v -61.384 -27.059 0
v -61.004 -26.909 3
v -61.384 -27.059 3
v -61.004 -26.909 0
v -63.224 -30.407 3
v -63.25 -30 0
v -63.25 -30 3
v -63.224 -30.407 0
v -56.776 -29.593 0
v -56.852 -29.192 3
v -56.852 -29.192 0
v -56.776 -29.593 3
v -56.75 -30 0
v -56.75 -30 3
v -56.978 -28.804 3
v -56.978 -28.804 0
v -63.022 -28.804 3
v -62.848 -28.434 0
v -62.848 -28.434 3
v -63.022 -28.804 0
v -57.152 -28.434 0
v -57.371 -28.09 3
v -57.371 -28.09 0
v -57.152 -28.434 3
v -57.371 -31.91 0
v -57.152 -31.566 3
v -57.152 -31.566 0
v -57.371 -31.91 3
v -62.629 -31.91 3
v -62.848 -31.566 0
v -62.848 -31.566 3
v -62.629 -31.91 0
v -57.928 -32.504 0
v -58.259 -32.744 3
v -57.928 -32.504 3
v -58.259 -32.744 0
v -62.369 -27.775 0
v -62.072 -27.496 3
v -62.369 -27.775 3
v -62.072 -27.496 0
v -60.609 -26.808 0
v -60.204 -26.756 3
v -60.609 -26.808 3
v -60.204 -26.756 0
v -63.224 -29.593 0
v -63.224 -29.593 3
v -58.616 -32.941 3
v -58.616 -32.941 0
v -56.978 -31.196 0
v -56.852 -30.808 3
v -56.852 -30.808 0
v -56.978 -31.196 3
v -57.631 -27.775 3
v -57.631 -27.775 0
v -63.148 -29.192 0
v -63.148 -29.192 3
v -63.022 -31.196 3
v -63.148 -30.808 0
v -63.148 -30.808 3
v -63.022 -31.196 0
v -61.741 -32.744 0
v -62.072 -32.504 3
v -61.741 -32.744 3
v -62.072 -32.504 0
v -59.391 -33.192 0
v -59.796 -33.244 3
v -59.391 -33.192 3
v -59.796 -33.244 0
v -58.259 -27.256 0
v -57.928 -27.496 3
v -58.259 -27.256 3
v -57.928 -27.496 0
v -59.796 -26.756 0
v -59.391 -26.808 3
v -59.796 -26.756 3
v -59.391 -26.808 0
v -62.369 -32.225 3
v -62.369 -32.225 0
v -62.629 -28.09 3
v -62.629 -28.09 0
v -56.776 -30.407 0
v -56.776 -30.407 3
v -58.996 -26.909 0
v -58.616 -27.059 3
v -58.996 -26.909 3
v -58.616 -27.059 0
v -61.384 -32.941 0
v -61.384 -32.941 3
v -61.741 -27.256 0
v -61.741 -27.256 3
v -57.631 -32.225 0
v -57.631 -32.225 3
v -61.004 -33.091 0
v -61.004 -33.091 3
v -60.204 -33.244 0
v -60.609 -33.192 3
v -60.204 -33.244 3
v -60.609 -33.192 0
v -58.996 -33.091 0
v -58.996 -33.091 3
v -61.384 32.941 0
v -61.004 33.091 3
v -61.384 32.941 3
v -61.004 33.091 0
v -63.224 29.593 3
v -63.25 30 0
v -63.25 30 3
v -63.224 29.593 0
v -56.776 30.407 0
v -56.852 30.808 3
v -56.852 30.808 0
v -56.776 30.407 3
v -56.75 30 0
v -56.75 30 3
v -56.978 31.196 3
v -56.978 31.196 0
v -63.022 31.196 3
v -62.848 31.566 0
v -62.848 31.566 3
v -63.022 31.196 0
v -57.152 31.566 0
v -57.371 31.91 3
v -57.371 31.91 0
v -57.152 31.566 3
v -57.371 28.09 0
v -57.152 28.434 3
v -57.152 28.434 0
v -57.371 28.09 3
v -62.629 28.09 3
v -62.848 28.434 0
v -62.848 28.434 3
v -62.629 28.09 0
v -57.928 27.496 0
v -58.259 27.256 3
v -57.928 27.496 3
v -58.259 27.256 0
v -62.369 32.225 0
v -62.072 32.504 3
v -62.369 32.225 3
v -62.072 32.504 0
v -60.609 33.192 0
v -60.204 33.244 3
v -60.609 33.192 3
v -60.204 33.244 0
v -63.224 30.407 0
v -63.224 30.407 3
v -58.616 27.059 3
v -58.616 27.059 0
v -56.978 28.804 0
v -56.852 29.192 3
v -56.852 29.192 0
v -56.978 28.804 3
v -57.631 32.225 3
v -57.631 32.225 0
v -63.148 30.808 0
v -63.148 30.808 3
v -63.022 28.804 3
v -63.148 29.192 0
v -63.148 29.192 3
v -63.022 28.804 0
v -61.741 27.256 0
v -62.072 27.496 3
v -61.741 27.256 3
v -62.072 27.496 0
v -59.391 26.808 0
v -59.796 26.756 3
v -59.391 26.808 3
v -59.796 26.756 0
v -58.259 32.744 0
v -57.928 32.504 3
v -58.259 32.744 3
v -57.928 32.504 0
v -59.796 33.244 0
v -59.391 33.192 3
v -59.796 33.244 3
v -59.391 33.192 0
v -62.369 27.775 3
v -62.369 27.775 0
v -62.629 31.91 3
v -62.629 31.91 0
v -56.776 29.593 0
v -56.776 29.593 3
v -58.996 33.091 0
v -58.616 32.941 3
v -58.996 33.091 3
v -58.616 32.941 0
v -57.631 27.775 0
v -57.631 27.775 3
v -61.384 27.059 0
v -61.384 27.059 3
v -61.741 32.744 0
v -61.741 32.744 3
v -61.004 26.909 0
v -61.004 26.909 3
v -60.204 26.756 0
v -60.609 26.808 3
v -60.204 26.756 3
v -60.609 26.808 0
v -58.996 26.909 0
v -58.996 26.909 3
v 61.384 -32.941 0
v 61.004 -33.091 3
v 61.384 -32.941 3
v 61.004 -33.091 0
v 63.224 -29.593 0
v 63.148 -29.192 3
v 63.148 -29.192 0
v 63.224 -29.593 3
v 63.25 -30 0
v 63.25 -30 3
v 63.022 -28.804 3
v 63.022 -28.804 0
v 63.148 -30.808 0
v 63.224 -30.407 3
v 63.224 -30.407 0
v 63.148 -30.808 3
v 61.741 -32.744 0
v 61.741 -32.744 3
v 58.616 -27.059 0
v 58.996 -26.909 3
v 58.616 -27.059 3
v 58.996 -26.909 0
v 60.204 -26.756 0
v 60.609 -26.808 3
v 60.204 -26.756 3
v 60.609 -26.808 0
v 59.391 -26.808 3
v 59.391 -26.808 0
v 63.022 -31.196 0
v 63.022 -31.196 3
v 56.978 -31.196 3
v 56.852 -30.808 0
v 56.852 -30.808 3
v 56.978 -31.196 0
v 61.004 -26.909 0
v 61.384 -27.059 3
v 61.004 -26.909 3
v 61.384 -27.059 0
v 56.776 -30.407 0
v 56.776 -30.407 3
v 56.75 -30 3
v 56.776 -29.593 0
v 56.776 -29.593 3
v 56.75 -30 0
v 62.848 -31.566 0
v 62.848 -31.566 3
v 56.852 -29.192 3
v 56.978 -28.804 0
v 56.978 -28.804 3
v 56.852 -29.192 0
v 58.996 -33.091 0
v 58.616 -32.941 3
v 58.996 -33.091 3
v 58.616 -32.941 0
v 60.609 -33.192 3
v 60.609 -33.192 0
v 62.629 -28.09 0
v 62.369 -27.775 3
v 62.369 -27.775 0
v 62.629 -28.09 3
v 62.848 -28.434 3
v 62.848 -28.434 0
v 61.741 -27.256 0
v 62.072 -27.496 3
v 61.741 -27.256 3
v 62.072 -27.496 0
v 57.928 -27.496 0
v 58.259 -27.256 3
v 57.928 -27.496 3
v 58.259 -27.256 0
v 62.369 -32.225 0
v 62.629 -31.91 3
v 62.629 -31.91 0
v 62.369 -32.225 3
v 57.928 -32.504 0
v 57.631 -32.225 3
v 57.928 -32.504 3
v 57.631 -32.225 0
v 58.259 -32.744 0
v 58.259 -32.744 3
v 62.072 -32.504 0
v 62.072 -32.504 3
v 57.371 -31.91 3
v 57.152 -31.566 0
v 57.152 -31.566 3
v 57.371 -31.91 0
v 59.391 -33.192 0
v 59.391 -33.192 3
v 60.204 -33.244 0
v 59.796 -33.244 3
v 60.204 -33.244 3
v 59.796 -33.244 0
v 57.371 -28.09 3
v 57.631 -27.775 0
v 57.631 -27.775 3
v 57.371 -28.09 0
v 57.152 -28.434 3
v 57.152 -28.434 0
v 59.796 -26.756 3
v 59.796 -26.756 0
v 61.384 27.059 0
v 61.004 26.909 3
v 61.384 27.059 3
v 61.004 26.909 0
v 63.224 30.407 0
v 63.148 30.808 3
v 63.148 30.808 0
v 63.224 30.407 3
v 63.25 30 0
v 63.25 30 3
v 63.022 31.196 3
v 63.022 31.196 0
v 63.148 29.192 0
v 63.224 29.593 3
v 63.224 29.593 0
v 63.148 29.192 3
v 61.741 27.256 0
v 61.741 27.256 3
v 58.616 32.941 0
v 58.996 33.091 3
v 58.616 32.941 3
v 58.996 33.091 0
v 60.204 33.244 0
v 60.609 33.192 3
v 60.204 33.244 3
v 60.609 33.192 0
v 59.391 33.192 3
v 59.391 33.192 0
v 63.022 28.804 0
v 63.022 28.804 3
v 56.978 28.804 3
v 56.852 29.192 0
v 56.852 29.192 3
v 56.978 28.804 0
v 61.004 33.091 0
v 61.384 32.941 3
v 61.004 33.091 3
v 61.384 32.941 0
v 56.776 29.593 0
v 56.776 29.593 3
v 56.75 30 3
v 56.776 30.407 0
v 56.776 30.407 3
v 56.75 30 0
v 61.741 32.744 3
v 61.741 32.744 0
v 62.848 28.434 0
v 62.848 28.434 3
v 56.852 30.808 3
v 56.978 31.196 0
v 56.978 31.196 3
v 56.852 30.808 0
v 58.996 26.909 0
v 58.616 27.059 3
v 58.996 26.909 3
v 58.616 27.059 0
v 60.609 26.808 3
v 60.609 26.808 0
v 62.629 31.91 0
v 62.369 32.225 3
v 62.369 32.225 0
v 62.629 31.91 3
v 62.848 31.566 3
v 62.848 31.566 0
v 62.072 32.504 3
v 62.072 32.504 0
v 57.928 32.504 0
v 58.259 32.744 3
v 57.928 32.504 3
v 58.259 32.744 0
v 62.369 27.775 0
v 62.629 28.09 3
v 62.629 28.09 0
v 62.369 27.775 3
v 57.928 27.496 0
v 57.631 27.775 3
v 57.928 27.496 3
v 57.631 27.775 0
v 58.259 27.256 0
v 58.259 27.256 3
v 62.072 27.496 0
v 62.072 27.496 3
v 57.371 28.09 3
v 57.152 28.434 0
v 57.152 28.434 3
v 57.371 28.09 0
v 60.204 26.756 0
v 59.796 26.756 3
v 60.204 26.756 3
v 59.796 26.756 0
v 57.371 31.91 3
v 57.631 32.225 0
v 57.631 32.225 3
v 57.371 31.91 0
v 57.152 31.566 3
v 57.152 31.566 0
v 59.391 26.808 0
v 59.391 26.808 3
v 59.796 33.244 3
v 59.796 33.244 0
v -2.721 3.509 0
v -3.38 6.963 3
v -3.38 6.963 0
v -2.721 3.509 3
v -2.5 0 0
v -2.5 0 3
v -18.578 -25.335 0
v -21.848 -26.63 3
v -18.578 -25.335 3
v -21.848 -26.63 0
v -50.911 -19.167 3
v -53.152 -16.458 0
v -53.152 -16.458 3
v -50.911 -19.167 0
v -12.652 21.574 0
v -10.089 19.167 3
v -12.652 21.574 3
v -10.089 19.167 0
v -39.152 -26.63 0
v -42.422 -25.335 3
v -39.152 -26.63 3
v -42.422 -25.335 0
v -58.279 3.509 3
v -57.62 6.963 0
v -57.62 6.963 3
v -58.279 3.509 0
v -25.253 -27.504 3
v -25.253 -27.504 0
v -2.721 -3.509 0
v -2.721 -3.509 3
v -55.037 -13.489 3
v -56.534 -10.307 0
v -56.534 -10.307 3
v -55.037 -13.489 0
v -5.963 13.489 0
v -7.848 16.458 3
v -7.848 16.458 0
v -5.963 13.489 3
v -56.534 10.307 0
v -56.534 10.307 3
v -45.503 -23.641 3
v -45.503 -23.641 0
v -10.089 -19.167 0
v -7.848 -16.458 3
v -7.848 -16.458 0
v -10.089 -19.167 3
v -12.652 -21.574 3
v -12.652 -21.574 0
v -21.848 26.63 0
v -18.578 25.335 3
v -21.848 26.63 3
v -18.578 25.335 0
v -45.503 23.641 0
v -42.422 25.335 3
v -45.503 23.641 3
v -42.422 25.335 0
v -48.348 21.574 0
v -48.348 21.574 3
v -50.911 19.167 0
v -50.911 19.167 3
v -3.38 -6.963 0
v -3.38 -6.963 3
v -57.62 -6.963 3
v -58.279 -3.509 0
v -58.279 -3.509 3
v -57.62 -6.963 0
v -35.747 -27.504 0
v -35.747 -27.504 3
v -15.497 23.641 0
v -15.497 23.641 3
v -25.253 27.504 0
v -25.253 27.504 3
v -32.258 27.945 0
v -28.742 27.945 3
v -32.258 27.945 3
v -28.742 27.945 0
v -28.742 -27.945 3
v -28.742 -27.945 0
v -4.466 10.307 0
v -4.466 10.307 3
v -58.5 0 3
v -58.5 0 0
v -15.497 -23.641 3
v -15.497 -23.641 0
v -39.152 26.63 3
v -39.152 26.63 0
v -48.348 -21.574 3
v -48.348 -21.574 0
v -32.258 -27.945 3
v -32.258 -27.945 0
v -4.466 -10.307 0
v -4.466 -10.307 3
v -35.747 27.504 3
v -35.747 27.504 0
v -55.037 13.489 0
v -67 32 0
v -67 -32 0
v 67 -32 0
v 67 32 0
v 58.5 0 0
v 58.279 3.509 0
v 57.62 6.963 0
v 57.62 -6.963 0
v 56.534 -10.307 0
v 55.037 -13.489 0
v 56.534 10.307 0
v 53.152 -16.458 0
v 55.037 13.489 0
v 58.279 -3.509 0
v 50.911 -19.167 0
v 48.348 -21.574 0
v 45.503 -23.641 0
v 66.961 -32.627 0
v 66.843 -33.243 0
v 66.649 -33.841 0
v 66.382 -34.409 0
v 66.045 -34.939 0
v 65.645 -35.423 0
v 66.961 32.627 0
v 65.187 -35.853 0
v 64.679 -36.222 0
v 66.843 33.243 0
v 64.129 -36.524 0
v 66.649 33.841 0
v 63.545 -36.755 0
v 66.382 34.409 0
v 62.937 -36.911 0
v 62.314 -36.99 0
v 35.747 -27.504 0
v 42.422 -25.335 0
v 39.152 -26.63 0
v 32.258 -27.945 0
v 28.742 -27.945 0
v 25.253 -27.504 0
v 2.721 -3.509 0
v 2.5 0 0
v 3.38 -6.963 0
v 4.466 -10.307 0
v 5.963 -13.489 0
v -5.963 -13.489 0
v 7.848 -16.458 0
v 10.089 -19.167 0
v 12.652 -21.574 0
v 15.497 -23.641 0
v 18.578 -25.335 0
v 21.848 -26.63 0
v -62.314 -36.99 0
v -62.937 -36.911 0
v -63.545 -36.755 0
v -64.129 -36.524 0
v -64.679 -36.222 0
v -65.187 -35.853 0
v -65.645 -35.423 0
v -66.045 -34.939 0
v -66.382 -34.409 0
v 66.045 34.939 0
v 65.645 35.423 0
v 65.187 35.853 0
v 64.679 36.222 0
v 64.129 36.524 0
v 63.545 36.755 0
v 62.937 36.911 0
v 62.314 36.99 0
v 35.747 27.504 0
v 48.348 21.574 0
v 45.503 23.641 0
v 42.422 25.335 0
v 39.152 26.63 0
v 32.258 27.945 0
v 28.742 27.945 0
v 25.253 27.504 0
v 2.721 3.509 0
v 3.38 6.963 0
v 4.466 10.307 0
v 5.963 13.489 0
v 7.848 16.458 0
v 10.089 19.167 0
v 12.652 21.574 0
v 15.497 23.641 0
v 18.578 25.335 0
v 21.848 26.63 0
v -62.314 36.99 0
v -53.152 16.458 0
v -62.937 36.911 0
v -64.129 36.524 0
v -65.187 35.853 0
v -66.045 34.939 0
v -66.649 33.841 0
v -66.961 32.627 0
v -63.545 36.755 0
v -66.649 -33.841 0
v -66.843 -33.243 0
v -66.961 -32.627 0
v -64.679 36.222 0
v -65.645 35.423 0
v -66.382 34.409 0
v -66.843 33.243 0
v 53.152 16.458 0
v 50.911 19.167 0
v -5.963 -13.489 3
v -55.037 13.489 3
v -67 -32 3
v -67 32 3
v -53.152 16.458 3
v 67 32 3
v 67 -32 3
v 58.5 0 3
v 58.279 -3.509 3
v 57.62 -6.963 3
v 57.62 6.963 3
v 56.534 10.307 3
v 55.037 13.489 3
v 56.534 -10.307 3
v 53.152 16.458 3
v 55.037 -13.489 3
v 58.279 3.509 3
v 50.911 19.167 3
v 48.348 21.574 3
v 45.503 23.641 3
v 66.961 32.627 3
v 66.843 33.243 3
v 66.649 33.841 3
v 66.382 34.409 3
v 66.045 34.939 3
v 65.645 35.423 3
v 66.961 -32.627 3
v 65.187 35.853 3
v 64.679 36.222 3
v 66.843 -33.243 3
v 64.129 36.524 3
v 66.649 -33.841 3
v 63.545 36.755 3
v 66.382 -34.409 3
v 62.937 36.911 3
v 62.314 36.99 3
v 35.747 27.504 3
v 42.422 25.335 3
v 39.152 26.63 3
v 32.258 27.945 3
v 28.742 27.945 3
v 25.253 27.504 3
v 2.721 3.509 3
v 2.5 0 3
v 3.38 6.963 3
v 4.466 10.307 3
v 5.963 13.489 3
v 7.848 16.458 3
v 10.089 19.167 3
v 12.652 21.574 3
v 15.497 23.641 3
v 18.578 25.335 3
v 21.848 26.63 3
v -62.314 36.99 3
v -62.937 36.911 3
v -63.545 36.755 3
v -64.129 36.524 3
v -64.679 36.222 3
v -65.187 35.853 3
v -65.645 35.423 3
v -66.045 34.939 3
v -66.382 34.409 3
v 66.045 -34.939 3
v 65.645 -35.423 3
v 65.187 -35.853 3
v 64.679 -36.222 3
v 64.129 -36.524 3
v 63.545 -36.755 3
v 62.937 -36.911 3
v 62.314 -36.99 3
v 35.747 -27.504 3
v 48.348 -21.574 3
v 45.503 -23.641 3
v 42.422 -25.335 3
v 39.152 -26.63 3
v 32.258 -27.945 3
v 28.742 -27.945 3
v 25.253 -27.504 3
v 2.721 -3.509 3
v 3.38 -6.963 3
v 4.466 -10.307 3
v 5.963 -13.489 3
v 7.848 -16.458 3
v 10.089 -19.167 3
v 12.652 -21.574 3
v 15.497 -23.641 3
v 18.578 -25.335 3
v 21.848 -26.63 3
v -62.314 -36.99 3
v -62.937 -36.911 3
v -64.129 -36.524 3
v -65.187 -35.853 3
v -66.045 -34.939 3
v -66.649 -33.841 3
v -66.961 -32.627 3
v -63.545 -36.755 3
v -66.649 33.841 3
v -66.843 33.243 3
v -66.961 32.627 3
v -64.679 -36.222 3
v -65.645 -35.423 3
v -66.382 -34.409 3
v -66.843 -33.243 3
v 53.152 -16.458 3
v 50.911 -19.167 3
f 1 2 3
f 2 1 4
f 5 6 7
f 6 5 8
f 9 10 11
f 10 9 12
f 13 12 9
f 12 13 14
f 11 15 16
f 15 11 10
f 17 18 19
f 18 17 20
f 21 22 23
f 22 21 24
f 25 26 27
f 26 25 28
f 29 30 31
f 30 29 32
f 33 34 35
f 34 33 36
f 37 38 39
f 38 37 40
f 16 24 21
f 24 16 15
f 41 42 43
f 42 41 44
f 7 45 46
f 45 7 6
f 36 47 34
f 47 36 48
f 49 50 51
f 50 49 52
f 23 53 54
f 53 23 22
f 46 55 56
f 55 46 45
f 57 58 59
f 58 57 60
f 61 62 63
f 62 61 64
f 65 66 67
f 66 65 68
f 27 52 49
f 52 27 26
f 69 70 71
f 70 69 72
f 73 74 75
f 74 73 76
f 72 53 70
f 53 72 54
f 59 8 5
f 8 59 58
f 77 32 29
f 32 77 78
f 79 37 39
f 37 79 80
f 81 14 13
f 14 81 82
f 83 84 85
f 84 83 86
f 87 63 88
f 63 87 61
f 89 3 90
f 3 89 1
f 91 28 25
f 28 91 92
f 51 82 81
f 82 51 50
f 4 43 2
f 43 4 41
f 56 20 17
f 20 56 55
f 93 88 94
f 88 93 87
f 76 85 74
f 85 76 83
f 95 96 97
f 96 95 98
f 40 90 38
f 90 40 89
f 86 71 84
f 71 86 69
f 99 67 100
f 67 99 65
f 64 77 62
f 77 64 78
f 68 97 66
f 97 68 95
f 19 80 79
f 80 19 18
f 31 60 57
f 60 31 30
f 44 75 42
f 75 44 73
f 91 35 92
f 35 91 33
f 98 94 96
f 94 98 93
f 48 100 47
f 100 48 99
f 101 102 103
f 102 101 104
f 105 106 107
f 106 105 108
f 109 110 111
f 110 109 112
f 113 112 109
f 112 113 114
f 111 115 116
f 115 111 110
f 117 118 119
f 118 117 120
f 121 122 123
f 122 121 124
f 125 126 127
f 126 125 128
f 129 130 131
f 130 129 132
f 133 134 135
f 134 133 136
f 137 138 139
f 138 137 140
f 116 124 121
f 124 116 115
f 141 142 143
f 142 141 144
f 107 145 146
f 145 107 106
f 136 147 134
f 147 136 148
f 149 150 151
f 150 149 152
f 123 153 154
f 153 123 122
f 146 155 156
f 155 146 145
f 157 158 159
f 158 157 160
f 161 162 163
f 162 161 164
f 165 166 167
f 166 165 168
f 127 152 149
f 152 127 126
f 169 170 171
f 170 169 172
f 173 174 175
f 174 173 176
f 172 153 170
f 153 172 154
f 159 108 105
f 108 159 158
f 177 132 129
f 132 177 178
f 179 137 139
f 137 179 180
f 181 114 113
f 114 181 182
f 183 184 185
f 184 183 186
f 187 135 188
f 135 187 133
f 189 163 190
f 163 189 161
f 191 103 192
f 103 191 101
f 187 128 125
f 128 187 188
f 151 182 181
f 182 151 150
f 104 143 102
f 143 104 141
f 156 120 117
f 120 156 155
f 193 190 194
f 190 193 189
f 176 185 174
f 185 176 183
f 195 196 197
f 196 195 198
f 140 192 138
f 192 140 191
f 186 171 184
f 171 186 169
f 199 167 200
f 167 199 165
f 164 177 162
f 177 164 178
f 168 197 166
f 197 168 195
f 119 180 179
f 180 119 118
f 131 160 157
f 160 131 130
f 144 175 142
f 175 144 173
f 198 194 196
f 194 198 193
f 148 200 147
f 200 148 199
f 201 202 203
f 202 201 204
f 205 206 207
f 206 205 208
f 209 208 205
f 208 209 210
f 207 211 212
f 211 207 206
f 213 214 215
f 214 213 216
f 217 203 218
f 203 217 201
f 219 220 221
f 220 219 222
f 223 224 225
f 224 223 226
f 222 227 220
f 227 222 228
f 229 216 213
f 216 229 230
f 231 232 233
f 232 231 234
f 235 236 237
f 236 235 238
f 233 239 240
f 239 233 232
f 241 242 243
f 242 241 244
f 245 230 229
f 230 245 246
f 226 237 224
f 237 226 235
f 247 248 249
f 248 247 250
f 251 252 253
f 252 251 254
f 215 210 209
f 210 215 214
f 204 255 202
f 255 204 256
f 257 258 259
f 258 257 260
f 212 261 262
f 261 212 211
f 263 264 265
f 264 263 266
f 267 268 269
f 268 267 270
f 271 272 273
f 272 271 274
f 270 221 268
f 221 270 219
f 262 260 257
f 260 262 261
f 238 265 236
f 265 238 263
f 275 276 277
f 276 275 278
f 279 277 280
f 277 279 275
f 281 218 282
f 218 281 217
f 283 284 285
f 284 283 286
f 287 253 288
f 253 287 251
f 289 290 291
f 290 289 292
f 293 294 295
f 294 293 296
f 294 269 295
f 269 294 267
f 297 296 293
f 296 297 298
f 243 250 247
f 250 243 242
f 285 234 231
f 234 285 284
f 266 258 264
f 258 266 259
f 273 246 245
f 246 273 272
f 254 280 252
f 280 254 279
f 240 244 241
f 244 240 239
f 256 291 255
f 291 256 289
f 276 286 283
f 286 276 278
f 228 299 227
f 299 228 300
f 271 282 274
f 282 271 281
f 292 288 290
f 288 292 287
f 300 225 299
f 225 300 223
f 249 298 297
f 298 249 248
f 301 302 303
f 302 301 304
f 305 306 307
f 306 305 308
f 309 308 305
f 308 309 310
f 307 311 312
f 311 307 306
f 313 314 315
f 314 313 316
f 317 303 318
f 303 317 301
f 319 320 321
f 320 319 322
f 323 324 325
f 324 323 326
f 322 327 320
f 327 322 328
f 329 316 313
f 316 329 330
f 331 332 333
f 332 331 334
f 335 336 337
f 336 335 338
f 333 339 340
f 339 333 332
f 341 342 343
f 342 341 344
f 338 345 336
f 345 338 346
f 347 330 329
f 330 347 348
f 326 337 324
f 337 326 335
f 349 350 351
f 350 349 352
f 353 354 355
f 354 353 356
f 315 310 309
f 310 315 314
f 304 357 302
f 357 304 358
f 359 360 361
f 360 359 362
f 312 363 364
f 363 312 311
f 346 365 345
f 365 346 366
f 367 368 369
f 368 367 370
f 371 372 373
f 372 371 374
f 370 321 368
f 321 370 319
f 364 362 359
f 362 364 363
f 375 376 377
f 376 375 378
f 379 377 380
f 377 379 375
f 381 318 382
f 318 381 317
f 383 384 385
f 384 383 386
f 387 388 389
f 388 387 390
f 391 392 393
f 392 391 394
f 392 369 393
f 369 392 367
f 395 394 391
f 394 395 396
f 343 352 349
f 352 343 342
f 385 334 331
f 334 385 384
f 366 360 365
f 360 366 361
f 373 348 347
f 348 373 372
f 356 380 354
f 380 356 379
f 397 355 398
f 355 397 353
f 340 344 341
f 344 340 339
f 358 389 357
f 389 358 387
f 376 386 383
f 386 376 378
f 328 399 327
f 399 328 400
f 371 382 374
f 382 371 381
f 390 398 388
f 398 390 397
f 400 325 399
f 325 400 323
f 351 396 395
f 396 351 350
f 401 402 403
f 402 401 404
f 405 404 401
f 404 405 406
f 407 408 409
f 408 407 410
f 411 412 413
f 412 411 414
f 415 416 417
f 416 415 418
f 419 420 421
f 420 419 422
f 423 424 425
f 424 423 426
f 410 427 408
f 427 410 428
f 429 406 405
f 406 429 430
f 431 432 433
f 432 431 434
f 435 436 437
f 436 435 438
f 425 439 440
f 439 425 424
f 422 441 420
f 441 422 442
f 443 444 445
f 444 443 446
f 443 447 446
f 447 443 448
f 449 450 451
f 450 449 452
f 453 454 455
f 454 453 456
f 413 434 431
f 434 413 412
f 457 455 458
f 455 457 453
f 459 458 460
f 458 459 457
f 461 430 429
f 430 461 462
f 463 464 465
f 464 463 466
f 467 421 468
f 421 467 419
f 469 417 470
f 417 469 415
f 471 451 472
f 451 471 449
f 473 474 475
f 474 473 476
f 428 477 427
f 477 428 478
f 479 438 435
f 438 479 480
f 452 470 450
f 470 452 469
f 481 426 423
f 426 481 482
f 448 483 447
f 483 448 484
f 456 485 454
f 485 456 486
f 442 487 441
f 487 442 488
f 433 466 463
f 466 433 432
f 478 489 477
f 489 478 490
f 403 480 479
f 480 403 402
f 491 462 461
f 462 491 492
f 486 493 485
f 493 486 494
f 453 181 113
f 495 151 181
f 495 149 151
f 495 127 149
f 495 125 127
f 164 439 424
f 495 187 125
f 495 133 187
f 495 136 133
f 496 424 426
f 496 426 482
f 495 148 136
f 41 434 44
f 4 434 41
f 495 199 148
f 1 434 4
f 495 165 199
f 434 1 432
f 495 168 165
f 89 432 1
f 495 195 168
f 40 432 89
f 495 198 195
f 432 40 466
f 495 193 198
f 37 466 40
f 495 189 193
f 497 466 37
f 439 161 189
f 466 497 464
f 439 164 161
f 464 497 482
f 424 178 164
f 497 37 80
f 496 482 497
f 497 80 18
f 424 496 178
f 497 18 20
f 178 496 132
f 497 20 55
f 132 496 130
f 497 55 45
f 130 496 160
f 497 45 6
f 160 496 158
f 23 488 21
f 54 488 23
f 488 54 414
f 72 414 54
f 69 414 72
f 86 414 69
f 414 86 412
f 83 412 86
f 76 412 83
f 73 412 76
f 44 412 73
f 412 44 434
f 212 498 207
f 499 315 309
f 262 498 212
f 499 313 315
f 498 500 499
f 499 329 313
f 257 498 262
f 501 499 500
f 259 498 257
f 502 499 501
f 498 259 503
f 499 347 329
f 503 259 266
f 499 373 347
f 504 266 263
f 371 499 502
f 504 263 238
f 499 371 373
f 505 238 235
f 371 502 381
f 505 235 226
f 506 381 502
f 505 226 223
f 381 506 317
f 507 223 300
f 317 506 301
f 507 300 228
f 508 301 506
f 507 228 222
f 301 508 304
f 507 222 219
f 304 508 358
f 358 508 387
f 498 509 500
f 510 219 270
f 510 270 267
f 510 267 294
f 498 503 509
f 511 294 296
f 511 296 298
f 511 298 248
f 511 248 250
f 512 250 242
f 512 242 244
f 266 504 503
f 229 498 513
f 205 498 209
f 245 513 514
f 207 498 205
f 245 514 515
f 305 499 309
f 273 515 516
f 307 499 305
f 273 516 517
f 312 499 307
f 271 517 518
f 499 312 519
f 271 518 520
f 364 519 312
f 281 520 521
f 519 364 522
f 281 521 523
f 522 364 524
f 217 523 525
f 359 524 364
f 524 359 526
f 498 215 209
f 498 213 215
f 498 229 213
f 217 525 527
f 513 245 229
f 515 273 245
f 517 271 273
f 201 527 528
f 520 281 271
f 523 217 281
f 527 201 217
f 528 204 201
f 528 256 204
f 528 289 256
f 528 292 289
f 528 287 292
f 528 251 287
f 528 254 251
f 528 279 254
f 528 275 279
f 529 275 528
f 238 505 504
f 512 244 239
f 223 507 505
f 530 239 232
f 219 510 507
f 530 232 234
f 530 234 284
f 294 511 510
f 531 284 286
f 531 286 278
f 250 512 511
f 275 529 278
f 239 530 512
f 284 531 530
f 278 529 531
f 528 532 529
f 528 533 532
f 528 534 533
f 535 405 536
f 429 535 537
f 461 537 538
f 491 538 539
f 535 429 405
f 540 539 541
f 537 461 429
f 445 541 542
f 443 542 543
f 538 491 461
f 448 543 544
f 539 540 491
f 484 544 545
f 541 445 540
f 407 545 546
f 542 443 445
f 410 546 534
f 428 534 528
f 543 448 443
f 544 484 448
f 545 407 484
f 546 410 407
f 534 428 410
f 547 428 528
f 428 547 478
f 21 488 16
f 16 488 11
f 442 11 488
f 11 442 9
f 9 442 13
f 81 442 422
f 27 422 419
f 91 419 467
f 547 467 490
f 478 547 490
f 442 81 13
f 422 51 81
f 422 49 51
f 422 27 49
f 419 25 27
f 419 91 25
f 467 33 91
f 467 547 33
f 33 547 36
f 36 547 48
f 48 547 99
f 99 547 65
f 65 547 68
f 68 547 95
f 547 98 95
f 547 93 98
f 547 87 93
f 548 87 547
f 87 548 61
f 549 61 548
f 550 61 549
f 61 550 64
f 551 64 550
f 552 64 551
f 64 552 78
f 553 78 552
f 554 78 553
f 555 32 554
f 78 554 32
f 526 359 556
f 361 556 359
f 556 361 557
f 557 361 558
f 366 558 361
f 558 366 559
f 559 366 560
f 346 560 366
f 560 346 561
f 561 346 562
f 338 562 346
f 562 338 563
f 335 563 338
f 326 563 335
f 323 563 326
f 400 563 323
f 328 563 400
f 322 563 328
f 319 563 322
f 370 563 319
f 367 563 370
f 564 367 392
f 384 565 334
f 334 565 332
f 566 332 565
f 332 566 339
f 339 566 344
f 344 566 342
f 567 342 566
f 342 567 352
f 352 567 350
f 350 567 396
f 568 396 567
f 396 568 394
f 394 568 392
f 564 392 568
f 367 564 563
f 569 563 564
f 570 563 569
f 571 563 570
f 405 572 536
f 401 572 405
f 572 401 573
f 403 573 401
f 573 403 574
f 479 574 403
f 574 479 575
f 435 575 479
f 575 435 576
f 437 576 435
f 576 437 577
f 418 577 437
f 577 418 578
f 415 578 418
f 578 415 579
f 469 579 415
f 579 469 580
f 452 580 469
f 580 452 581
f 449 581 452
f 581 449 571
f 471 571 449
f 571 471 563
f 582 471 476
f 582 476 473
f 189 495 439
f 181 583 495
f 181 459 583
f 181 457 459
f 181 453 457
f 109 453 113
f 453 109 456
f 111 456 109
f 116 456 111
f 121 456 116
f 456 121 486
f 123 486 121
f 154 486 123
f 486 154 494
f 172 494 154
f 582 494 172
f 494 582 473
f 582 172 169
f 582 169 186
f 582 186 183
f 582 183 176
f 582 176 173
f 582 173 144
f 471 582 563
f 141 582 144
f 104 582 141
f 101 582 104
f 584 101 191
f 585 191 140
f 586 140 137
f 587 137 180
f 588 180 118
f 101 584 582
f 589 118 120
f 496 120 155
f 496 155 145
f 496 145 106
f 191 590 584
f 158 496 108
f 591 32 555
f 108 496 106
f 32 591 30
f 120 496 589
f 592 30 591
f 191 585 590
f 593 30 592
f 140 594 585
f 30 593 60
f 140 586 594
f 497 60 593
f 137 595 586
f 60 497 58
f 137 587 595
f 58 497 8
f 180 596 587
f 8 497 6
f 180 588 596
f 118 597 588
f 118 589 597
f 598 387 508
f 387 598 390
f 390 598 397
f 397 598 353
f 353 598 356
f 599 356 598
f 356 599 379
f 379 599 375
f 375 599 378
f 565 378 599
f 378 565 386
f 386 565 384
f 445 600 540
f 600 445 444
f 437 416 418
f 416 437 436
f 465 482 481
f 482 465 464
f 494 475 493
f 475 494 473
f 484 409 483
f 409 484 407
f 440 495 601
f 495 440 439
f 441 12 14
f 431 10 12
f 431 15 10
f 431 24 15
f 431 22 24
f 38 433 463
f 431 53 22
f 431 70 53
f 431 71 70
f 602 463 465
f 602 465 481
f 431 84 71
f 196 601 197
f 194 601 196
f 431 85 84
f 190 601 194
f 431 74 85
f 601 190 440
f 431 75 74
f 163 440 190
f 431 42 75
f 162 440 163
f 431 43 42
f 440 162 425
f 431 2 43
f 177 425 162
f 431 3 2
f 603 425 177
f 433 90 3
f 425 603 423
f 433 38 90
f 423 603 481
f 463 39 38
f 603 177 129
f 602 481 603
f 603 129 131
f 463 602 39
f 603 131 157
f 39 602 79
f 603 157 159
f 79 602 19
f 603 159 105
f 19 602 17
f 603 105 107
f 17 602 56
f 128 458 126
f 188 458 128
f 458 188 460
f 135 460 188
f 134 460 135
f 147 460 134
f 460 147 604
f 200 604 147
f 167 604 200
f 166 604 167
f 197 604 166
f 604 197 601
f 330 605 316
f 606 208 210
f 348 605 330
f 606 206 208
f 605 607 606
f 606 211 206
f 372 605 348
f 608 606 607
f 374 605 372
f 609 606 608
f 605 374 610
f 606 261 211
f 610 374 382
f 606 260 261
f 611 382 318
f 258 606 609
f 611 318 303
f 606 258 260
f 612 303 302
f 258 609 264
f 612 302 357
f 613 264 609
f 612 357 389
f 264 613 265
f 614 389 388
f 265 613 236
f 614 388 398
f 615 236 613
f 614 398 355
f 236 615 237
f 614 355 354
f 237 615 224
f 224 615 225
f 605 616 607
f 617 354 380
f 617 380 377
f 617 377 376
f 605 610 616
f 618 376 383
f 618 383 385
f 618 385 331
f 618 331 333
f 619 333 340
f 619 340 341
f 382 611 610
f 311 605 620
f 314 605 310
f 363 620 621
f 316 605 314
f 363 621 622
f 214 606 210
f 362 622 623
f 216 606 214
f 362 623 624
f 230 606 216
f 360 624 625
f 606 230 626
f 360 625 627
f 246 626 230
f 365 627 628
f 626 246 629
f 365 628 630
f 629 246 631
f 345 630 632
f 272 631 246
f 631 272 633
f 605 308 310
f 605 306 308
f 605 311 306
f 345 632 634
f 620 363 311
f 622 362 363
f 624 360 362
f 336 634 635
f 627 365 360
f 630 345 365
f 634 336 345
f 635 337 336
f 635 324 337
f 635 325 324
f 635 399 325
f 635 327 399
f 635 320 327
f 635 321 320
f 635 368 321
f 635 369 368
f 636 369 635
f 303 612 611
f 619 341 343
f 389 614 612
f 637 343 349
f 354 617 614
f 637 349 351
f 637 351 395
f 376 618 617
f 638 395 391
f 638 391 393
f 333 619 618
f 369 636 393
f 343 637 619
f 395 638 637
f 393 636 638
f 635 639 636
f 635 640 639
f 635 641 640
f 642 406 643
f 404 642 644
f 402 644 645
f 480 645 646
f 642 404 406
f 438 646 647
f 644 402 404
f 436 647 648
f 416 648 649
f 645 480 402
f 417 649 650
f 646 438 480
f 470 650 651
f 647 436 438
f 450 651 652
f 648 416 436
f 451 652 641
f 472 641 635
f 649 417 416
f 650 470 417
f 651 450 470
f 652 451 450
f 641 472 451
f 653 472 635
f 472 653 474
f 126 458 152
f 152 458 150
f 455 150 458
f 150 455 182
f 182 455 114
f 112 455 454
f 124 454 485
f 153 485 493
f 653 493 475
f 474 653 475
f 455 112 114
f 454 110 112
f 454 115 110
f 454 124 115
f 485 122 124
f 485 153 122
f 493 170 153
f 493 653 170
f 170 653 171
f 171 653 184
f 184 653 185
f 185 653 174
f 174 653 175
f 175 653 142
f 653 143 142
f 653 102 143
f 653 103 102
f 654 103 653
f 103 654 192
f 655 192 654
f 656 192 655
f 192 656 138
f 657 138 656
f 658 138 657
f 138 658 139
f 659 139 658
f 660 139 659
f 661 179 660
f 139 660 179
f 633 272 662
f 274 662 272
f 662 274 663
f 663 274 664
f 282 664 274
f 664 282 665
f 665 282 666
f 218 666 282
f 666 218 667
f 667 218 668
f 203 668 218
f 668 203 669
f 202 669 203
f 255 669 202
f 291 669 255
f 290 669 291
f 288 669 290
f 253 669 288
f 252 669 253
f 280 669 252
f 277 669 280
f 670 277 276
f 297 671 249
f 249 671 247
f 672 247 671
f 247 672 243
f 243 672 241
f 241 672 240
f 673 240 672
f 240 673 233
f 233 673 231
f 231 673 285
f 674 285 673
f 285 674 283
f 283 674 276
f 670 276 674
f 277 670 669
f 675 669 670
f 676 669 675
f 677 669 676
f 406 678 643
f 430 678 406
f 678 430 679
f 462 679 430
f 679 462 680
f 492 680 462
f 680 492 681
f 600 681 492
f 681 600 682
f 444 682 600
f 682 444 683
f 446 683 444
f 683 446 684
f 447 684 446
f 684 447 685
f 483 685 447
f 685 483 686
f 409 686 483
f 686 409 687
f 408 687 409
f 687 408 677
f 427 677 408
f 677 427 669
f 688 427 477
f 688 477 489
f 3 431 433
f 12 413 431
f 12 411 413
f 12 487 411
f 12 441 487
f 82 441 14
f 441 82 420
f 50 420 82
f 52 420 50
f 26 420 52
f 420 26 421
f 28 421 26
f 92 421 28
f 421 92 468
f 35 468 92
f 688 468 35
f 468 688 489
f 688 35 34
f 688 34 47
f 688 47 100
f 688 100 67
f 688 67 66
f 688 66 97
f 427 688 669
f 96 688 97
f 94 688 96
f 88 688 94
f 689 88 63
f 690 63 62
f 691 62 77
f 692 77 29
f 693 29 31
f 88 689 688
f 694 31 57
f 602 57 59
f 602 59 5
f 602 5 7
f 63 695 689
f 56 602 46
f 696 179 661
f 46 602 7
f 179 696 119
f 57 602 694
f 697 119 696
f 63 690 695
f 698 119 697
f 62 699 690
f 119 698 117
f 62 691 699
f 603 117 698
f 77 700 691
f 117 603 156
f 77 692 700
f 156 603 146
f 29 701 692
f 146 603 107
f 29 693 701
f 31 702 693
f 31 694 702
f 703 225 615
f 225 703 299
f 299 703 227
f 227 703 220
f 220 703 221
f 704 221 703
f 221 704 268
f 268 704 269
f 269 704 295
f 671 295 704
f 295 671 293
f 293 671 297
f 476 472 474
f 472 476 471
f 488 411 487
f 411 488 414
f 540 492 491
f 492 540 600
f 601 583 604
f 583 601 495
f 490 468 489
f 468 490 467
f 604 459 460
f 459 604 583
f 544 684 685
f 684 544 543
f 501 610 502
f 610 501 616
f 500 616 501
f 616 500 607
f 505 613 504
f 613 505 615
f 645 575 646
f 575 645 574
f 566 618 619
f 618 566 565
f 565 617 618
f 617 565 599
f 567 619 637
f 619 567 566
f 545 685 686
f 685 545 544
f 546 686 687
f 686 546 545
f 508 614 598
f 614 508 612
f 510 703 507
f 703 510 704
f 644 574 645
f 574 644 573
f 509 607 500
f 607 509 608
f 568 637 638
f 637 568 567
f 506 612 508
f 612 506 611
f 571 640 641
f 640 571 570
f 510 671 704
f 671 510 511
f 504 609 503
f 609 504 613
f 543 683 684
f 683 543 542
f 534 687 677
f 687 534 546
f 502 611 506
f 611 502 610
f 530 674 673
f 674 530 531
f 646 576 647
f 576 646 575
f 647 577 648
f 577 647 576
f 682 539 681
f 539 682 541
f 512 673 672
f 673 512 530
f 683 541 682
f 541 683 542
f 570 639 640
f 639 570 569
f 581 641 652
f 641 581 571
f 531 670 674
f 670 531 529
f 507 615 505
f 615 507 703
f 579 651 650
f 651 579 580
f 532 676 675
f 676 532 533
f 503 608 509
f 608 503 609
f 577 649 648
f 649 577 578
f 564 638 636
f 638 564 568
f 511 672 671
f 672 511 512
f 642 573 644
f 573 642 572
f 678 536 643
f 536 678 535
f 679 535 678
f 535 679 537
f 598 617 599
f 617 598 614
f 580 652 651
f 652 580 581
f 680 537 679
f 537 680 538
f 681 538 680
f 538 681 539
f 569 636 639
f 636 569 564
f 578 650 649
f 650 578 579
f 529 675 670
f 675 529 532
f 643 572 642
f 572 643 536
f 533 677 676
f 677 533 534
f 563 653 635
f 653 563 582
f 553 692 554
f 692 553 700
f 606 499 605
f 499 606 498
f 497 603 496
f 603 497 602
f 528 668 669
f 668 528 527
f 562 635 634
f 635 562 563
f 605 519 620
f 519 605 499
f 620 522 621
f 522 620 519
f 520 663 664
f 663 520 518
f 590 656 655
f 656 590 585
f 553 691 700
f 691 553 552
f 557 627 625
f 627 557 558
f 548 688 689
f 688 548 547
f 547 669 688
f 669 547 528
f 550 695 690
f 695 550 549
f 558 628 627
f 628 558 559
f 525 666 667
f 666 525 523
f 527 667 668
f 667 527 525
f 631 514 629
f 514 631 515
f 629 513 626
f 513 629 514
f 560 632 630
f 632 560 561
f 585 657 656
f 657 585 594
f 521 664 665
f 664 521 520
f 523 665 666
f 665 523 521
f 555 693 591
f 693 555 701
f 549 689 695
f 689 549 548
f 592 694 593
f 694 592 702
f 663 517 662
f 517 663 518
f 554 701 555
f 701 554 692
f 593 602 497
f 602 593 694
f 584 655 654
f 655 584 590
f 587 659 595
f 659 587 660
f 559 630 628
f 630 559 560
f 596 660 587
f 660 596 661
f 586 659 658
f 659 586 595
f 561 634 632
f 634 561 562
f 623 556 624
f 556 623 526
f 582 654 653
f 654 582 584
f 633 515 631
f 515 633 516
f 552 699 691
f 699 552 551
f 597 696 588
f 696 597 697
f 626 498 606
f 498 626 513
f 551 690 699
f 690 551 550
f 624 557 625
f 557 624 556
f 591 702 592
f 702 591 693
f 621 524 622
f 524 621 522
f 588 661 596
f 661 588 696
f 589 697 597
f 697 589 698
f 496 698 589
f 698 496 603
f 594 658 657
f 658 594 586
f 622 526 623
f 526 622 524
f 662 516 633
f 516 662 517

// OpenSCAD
$fn = 50;

difference() {
	union() {
		hull() {
			translate(v = [-62.0, 32.0, 0]) {
				cylinder(h = 3, r = 5);
			}
			translate(v = [62.0, 32.0, 0]) {
				cylinder(h = 3, r = 5);
			}
			translate(v = [-62.0, -32.0, 0]) {
				cylinder(h = 3, r = 5);
			}
			translate(v = [62.0, -32.0, 0]) {
				cylinder(h = 3, r = 5);
			}
		}
	}
	union() {
		translate(v = [-60.0, -30.0, -100.0]) {
			cylinder(h = 200, r = 3.25);
		}
		translate(v = [-60.0, 30.0, -100.0]) {
			cylinder(h = 200, r = 3.25);
		}
		translate(v = [60.0, -30.0, -100.0]) {
			cylinder(h = 200, r = 3.25);
		}
		translate(v = [60.0, 30.0, -100.0]) {
			cylinder(h = 200, r = 3.25);
		}
		translate(v = [-60.0, -30.0, -100.0]) {
			cylinder(h = 200, r = 1.8);
		}
		translate(v = [-60.0, 30.0, -100.0]) {
			cylinder(h = 200, r = 1.8);
		}
		translate(v = [60.0, -30.0, -100.0]) {
			cylinder(h = 200, r = 1.8);
		}
		translate(v = [60.0, 30.0, -100.0]) {
			cylinder(h = 200, r = 1.8);
		}
		translate(v = [-30.5, 0, 0.0]) {
			cylinder(h = 3, r = 28.0);
		}
		translate(v = [30.5, 0, 0.0]) {
			cylinder(h = 3, r = 28.0);
		}
	}
}
